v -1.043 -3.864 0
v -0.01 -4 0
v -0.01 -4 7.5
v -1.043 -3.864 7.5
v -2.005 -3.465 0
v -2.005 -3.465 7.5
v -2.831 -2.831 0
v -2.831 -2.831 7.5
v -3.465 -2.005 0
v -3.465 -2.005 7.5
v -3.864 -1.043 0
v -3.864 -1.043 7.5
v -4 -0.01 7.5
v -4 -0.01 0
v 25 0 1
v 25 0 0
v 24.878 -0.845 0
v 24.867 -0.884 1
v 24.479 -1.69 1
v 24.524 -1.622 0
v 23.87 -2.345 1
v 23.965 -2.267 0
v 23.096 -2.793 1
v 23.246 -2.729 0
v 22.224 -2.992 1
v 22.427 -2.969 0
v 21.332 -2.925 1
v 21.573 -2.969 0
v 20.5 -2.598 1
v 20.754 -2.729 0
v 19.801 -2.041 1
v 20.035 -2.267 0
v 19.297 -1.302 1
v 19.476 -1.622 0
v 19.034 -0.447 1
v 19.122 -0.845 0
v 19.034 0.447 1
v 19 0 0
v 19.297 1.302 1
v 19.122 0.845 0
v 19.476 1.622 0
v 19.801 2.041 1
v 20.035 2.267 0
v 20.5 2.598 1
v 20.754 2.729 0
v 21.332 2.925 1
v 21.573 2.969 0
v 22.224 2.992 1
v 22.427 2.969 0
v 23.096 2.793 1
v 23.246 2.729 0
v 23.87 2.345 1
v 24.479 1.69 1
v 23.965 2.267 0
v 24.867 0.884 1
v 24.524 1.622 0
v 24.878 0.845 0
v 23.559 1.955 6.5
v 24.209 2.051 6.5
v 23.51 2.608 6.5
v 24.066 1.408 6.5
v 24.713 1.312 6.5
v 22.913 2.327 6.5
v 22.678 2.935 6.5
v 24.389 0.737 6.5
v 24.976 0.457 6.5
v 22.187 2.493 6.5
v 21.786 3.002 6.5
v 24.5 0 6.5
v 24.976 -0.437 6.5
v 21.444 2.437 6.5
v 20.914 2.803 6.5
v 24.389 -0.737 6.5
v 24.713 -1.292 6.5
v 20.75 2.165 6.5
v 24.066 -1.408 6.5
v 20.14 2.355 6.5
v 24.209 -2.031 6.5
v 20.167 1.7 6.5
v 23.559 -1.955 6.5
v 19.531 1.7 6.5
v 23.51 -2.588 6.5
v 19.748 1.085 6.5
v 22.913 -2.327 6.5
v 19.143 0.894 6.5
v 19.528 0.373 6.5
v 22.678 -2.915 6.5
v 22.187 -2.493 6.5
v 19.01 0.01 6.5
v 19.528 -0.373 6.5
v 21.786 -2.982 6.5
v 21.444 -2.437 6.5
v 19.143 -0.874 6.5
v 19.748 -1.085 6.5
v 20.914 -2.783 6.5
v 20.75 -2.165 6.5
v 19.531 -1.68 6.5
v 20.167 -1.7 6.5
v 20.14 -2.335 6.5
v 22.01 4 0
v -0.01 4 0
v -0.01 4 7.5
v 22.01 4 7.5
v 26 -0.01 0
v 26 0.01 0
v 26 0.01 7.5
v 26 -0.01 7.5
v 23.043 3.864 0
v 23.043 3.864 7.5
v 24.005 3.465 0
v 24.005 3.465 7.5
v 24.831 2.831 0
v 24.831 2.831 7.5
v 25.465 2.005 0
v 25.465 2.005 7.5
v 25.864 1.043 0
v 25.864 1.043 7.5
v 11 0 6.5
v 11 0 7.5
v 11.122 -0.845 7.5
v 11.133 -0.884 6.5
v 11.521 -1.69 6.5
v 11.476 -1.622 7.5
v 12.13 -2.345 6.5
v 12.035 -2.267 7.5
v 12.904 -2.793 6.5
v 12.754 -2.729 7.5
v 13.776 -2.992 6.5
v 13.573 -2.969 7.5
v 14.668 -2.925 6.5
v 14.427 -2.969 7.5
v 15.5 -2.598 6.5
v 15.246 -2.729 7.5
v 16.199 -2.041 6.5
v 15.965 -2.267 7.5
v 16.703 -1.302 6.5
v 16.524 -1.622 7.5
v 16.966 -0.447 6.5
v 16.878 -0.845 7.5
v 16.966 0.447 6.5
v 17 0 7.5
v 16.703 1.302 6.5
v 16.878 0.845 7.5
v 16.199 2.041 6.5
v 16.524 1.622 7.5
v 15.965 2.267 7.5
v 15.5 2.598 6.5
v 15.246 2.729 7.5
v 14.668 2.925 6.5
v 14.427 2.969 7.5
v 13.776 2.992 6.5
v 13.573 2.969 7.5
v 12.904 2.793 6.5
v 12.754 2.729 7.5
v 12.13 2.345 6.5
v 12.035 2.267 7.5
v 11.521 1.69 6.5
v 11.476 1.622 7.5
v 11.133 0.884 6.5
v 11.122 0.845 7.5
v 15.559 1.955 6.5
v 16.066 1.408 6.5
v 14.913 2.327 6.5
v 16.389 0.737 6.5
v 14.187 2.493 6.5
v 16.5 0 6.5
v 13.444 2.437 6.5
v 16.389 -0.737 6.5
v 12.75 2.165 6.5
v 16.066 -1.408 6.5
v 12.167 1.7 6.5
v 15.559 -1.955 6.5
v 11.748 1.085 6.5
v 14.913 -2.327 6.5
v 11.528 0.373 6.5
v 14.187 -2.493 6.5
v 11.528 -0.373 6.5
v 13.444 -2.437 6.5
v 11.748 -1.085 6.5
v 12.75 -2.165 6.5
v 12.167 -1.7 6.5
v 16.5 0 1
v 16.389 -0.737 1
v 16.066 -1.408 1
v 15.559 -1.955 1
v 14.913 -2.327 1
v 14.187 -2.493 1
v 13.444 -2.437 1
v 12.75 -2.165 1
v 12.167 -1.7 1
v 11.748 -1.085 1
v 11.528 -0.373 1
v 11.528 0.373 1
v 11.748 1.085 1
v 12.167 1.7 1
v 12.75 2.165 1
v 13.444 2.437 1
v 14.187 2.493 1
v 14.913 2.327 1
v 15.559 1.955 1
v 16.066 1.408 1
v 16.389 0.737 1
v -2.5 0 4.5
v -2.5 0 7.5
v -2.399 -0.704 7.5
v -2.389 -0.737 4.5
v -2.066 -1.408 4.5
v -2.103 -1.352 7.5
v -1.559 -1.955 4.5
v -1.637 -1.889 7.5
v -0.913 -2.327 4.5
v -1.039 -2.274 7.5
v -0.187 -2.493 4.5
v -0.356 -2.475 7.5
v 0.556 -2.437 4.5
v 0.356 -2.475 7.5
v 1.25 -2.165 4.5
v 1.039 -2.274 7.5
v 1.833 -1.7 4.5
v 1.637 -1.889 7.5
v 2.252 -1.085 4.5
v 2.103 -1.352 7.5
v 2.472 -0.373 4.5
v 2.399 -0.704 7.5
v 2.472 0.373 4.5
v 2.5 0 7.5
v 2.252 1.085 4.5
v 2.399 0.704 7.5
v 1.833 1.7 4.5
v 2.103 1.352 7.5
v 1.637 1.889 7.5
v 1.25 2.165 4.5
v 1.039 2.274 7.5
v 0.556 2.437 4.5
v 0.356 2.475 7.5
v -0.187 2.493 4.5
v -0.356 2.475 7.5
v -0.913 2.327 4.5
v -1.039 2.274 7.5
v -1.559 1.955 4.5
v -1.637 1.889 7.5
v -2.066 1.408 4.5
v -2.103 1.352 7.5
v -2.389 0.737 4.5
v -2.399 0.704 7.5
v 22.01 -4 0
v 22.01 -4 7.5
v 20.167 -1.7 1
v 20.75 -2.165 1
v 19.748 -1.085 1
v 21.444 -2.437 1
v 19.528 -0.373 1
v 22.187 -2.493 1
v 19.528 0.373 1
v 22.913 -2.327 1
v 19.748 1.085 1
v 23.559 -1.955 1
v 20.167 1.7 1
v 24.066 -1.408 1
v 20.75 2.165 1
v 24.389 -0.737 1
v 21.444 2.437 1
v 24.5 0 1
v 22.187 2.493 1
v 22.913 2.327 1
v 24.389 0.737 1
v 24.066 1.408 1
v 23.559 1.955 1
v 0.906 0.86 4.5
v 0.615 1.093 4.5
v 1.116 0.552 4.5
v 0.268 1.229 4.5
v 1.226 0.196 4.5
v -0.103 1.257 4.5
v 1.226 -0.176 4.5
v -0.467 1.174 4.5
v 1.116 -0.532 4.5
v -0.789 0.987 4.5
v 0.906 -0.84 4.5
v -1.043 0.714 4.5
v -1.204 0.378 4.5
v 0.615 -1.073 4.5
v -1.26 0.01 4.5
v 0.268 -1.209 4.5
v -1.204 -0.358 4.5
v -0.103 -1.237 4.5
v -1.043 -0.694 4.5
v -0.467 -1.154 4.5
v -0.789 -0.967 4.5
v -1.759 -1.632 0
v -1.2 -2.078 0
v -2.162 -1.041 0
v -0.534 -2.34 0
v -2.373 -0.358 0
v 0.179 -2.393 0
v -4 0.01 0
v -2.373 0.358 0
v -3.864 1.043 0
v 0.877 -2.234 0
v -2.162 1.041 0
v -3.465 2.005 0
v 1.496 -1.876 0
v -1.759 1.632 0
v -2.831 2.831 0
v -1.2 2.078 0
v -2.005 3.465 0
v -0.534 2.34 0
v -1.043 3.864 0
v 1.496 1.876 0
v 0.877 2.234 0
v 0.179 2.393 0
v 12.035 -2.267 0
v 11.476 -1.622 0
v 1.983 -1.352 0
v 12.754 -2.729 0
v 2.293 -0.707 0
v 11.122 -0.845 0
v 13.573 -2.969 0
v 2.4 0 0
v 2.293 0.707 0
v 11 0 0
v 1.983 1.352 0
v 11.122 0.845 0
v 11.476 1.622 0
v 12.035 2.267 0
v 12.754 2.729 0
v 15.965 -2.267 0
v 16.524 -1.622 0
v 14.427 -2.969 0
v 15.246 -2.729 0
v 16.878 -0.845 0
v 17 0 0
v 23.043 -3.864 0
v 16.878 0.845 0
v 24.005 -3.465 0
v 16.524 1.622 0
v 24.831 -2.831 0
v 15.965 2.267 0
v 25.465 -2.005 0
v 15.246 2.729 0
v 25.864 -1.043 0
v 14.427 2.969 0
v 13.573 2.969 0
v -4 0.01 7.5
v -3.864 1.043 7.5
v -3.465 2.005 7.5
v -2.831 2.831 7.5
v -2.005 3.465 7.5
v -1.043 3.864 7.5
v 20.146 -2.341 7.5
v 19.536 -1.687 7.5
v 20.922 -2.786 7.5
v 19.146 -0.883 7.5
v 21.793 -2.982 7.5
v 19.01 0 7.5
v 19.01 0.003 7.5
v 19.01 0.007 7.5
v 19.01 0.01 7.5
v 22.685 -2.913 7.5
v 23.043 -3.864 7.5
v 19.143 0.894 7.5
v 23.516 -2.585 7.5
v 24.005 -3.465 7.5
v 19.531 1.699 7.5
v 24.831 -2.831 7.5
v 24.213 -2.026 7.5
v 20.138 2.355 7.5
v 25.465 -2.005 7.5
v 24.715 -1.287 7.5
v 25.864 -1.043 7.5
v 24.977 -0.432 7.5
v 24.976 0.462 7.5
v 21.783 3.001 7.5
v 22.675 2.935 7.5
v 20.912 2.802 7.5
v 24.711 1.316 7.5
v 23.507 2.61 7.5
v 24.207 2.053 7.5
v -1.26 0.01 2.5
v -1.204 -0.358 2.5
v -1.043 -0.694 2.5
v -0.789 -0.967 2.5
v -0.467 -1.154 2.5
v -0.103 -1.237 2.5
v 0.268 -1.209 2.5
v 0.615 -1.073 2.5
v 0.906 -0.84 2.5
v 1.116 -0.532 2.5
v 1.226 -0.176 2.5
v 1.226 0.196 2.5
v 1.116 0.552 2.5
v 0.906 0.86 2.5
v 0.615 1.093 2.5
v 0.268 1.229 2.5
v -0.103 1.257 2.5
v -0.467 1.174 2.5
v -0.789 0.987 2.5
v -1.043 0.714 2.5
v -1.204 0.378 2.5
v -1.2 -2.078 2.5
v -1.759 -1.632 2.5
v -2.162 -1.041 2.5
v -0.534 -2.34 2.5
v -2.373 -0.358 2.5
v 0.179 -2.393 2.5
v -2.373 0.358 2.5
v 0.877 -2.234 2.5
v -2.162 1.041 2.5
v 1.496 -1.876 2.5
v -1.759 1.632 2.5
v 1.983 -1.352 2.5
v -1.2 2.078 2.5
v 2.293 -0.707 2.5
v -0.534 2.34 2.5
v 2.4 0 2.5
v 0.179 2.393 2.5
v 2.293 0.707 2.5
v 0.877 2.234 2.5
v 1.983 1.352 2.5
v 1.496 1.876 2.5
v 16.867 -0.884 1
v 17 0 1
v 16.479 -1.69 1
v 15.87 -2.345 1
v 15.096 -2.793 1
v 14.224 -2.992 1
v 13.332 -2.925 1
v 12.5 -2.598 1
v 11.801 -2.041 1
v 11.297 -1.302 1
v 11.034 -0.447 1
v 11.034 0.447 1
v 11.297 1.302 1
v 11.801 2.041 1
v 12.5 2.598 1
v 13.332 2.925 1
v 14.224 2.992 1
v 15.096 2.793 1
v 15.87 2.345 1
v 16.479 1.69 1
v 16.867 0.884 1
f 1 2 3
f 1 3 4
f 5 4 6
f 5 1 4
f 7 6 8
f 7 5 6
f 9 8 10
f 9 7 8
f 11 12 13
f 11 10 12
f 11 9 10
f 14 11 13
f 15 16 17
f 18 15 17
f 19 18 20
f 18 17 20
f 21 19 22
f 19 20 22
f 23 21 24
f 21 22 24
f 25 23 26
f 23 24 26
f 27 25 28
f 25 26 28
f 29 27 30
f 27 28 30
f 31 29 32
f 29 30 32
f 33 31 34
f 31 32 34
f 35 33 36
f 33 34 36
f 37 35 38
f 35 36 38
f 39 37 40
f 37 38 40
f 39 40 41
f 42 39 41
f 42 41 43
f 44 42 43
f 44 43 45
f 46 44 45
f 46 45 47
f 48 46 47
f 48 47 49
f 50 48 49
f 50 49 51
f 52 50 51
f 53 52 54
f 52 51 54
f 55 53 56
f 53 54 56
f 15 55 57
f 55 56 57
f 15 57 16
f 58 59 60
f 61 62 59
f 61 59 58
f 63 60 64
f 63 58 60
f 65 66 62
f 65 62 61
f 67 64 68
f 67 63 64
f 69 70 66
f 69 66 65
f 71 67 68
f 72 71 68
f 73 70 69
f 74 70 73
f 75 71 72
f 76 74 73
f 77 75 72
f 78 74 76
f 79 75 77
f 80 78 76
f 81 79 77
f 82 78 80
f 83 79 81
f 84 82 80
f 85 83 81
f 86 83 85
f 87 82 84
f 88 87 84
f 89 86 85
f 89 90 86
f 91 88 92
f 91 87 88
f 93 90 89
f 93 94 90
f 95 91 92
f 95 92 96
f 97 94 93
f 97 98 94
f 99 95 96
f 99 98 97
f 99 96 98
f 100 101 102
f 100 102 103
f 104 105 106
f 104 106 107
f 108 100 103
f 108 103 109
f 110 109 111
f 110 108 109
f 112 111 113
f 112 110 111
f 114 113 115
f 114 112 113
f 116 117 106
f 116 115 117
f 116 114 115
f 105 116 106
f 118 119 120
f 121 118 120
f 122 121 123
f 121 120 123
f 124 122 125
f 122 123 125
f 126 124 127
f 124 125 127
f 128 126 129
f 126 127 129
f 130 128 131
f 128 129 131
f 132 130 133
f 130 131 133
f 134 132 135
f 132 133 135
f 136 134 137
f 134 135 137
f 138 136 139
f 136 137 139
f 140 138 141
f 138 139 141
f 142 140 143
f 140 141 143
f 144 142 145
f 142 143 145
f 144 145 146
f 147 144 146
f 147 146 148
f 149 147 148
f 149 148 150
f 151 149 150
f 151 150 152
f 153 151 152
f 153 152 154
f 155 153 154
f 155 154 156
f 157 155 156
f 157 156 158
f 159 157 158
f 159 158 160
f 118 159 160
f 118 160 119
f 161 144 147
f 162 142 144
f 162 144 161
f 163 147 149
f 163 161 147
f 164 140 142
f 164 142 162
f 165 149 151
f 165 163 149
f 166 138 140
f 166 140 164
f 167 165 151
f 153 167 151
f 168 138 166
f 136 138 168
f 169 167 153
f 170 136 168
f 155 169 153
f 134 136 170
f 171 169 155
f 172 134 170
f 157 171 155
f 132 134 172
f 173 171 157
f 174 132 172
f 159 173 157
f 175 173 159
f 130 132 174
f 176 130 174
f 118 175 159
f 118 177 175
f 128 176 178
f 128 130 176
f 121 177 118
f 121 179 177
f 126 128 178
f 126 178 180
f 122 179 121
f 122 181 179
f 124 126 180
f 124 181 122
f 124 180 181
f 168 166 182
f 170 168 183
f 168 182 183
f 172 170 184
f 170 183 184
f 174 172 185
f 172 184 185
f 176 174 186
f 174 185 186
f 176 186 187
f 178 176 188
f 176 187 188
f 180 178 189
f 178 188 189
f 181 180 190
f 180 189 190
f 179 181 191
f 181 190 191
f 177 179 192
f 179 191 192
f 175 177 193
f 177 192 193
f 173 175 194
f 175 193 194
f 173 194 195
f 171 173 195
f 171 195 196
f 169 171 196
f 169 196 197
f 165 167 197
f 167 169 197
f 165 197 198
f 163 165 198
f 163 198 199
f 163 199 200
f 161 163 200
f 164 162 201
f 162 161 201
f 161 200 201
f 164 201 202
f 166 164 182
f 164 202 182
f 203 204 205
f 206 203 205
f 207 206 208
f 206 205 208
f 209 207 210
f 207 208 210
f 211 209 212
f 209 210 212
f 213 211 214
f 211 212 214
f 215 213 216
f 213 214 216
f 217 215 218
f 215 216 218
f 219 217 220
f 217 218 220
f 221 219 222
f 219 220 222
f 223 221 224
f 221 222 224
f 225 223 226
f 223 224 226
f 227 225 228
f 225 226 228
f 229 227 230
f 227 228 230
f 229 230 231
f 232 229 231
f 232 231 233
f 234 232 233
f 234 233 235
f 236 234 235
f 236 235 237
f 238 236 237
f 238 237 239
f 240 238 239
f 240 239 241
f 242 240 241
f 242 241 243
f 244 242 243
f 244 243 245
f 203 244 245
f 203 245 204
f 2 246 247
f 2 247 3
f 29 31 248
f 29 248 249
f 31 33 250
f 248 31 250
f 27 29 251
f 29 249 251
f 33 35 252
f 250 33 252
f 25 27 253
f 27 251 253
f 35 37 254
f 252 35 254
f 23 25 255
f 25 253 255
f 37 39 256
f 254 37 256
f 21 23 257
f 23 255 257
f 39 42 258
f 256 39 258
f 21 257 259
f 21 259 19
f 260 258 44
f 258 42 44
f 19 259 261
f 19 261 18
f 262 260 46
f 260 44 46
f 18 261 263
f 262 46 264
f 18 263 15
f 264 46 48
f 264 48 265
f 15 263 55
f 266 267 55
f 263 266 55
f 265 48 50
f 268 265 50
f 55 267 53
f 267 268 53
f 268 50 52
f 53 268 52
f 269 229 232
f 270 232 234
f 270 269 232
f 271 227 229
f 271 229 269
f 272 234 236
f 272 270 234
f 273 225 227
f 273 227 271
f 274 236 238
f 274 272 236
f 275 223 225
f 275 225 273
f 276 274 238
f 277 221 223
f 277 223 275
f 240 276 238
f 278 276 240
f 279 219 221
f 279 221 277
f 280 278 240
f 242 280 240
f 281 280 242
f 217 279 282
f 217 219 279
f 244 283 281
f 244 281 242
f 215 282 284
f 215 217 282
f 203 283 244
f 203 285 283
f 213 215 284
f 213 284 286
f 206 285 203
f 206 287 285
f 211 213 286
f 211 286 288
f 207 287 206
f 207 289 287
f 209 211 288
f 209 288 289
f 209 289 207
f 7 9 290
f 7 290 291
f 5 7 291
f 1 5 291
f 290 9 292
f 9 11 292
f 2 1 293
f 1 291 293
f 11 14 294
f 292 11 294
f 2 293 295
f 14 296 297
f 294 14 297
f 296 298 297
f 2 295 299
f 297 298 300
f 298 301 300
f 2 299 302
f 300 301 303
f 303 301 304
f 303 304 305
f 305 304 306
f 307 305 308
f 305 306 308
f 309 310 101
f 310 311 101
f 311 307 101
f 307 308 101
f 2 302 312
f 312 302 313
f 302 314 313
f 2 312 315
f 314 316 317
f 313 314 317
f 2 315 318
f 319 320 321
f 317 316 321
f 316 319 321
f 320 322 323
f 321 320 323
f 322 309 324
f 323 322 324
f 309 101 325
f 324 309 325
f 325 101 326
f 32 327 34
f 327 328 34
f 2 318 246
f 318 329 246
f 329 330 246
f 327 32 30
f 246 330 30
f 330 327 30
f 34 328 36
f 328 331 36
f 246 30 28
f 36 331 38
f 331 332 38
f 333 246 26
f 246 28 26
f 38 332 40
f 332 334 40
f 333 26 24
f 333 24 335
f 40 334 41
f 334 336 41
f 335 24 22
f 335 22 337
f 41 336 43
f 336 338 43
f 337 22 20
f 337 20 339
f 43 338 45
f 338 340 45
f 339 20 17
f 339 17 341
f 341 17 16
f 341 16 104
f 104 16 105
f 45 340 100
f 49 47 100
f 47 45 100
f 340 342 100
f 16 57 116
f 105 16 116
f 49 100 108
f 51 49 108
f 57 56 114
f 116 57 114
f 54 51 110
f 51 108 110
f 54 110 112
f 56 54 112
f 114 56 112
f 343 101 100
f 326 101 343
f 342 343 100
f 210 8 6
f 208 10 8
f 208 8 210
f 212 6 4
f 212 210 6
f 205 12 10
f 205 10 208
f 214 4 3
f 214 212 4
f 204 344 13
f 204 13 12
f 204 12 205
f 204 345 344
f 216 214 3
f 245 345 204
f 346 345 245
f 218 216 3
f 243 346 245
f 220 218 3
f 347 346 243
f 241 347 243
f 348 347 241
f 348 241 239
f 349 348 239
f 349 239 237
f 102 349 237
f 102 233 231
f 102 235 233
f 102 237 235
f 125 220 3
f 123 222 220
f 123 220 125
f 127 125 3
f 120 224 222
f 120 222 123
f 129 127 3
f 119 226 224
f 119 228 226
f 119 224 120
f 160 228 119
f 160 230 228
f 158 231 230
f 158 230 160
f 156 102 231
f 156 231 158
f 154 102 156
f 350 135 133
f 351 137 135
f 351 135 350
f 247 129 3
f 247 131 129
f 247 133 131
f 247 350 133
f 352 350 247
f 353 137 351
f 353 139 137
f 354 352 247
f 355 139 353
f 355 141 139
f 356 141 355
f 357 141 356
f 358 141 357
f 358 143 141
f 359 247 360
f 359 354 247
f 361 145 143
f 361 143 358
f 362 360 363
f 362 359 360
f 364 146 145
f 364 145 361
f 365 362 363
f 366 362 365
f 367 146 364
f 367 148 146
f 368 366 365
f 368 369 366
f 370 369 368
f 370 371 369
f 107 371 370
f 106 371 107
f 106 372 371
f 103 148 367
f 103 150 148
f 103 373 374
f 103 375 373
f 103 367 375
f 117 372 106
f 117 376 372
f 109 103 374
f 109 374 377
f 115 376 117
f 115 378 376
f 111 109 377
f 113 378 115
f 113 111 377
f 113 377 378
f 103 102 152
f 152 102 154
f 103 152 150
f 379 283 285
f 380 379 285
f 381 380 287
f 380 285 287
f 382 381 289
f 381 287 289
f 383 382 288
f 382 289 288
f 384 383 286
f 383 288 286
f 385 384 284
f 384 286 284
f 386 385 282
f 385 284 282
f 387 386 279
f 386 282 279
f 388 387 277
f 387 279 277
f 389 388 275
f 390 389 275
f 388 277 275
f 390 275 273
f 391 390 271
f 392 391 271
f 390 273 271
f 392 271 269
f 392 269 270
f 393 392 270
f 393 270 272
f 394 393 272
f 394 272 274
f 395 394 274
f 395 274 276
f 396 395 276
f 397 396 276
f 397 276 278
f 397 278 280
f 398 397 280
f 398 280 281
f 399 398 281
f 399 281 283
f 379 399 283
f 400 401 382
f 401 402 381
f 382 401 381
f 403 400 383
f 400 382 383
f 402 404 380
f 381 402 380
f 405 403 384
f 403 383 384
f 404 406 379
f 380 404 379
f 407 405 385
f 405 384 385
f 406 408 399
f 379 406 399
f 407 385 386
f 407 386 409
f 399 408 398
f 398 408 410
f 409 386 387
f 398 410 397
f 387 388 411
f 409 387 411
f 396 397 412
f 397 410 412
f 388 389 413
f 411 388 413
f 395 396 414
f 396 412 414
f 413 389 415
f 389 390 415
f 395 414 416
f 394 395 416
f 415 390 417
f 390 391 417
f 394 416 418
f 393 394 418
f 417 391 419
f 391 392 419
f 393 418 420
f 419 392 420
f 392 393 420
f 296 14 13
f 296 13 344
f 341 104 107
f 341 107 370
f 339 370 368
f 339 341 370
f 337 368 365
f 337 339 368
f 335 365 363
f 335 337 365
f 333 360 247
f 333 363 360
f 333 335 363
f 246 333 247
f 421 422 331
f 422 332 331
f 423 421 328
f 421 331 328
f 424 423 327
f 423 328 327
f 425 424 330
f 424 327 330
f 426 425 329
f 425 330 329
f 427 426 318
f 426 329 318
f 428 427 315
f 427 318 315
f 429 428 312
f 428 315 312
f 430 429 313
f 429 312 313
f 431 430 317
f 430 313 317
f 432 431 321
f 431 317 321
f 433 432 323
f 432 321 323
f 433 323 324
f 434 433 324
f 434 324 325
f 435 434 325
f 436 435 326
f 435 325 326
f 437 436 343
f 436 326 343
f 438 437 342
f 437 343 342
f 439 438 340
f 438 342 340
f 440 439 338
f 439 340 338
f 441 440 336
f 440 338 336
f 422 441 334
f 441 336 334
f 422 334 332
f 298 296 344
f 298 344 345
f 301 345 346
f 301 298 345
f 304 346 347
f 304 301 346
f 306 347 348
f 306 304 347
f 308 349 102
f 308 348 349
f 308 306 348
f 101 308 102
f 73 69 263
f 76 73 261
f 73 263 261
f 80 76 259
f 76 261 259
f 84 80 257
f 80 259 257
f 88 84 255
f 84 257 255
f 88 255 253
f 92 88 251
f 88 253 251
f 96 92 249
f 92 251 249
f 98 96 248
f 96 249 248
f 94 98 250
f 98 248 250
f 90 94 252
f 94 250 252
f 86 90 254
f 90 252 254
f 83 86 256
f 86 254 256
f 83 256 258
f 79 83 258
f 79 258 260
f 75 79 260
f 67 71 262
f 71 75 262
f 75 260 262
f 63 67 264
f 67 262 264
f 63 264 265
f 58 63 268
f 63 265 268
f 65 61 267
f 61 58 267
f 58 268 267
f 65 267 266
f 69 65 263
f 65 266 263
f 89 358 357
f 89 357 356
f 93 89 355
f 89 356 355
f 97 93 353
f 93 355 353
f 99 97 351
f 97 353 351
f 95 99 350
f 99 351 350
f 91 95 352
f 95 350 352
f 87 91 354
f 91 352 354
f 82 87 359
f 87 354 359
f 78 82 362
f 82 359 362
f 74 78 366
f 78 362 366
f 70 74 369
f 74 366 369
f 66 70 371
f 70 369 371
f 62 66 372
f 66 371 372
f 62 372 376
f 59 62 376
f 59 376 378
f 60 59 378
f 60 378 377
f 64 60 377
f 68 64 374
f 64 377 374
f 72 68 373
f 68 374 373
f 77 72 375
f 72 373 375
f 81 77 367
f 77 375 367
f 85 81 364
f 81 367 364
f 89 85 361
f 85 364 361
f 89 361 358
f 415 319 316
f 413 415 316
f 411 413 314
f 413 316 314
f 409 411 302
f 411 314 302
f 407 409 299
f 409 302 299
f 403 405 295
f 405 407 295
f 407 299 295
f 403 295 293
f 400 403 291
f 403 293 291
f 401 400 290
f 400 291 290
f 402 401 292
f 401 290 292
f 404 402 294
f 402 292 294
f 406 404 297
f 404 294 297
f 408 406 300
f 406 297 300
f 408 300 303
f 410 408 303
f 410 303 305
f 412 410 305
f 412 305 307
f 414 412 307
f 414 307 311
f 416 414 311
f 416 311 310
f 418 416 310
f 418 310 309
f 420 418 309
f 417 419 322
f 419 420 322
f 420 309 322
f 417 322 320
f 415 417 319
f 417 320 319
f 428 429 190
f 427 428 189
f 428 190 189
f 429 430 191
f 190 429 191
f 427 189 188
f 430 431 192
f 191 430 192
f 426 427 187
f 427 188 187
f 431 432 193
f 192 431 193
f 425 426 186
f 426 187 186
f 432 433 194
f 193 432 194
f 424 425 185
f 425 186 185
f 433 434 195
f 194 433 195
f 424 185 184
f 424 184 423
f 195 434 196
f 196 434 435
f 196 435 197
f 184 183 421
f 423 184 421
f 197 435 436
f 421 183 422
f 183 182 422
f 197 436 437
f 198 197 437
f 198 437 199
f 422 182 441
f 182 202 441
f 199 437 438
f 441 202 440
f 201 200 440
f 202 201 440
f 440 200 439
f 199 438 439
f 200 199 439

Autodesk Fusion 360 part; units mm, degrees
sketch "Sketch1" plane through (0, 0, 0) normal (0, 0, 1) x (1, 0, 0)
  line L0 (0, 0) -> (22, 0)
  circle A0 centre (22, 0) radius 2.5
  line L1 (22, 0) -> (14, 0)
  circle A1 centre (14, 0) radius 2.5
  circle A2 centre (0, 0) radius 2.4
  line L2 (22.01, -4) -> (-0.01, -4)
  line L3 (-4, -0.01) -> (-4, 0.01)
  line L4 (-0.01, 4) -> (22.01, 4)
  line L5 (26, 0.01) -> (26, -0.01)
  arc A3 (-4, -0.01) -> (-0.01, -4) centre (-0.01, -0.01) ccw
  arc A4 (-0.01, 4) -> (-4, 0.01) centre (-0.01, 0.01) ccw
  arc A5 (26, 0.01) -> (22.01, 4) centre (22.01, 0.01) ccw
  arc A6 (22.01, -4) -> (26, -0.01) centre (22.01, -0.01) ccw
  dimension "d1" = 22
  dimension "d2" = 5
  dimension "d3" = 8
  dimension "d4" = 5
  dimension "d5" = 4.8
  dimension "d6" = 3.99
  dimension "d7" = 3.99
  dimension "d8" = 3.99
  dimension "d9" = 3.99
extrude "Extrude1" add sketch "Sketch1" along normal blind 7.5 contours A2 | L2 L3 L4 L5 A3 A4 A5 A6
extrude "Extrude2" cut sketch "Sketch1" along normal blind 2.5 contours A2
sketch "Sketch2" plane through (0, 0, 7.5) normal (0, 0, 1) x (-1, 0, 0)
  circle A0 centre (-22, 0) radius 2.5
  circle A1 centre (-14, 0) radius 2.5
  arc A2 (4, 0.01) -> (0.01, 4) centre (0.01, 0.01) ccw
  line L0 (0.01, 4) -> (-22.01, 4)
  arc A3 (-22.01, 4) -> (-26, 0.01) centre (-22.01, 0.01) ccw
  line L1 (-26, 0.01) -> (-26, -0.01)
  arc A4 (-26, -0.01) -> (-22.01, -4) centre (-22.01, -0.01) ccw
  line L2 (-22.01, -4) -> (0.01, -4)
  arc A5 (0.01, -4) -> (4, -0.01) centre (0.01, -0.01) ccw
  line L3 (4, -0.01) -> (4, 0.01)
  circle A6 centre (0.01, -0.01) radius 1.25
  dimension "d14" = 2.5
extrude "Extrude3" cut sketch "Sketch2" against normal blind 100 contours A6
sketch "Sketch3" plane through (0, 0, 7.5) normal (0, 0, 1) x (-1, 0, 0)
  circle A0 centre (0, 0) radius 2.5
  dimension "d17" = 5
extrude "Extrude4" cut sketch "Sketch3" against normal blind 3
sketch "Sketch4" plane through (0, 0, 0) normal (0, 0, 1) x (1, 0, 0)
  circle A0 centre (14, 0) radius 3
  circle A1 centre (22, 0) radius 3
  dimension "d20" = 6
  dimension "d21" = 6
extrude "Extrude5" cut sketch "Sketch4" along normal blind 1 contours A0
extrude "Extrude6" cut sketch "Sketch4" along normal blind 1 contours A1
sketch "Sketch5" plane through (0, 0, 7.5) normal (0, 0, 1) x (-1, 0, 0)
  circle A0 centre (0, 0) radius 2.5
  circle A1 centre (-22, 0) radius 2.5
  circle A2 centre (-14, 0) radius 2.5
  arc A3 (4, 0.01) -> (0.01, 4) centre (0.01, 0.01) ccw
  line L0 (0.01, 4) -> (-22.01, 4)
  arc A4 (-22.01, 4) -> (-26, 0.01) centre (-22.01, 0.01) ccw
  line L1 (-26, 0.01) -> (-26, -0.01)
  arc A5 (-26, -0.01) -> (-22.01, -4) centre (-22.01, -0.01) ccw
  line L2 (-22.01, -4) -> (0.01, -4)
  arc A6 (0.01, -4) -> (4, -0.01) centre (0.01, -0.01) ccw
  line L3 (4, -0.01) -> (4, 0.01)
  circle A7 centre (-14, 0) radius 3
  circle A8 centre (-22.01, -0.01) radius 3
  dimension "d26" = 6
  dimension "d27" = 6
extrude "Extrude7" cut sketch "Sketch5" against normal blind 1 contours A8
extrude "Extrude8" cut sketch "Sketch5" against normal blind 1 contours A7
